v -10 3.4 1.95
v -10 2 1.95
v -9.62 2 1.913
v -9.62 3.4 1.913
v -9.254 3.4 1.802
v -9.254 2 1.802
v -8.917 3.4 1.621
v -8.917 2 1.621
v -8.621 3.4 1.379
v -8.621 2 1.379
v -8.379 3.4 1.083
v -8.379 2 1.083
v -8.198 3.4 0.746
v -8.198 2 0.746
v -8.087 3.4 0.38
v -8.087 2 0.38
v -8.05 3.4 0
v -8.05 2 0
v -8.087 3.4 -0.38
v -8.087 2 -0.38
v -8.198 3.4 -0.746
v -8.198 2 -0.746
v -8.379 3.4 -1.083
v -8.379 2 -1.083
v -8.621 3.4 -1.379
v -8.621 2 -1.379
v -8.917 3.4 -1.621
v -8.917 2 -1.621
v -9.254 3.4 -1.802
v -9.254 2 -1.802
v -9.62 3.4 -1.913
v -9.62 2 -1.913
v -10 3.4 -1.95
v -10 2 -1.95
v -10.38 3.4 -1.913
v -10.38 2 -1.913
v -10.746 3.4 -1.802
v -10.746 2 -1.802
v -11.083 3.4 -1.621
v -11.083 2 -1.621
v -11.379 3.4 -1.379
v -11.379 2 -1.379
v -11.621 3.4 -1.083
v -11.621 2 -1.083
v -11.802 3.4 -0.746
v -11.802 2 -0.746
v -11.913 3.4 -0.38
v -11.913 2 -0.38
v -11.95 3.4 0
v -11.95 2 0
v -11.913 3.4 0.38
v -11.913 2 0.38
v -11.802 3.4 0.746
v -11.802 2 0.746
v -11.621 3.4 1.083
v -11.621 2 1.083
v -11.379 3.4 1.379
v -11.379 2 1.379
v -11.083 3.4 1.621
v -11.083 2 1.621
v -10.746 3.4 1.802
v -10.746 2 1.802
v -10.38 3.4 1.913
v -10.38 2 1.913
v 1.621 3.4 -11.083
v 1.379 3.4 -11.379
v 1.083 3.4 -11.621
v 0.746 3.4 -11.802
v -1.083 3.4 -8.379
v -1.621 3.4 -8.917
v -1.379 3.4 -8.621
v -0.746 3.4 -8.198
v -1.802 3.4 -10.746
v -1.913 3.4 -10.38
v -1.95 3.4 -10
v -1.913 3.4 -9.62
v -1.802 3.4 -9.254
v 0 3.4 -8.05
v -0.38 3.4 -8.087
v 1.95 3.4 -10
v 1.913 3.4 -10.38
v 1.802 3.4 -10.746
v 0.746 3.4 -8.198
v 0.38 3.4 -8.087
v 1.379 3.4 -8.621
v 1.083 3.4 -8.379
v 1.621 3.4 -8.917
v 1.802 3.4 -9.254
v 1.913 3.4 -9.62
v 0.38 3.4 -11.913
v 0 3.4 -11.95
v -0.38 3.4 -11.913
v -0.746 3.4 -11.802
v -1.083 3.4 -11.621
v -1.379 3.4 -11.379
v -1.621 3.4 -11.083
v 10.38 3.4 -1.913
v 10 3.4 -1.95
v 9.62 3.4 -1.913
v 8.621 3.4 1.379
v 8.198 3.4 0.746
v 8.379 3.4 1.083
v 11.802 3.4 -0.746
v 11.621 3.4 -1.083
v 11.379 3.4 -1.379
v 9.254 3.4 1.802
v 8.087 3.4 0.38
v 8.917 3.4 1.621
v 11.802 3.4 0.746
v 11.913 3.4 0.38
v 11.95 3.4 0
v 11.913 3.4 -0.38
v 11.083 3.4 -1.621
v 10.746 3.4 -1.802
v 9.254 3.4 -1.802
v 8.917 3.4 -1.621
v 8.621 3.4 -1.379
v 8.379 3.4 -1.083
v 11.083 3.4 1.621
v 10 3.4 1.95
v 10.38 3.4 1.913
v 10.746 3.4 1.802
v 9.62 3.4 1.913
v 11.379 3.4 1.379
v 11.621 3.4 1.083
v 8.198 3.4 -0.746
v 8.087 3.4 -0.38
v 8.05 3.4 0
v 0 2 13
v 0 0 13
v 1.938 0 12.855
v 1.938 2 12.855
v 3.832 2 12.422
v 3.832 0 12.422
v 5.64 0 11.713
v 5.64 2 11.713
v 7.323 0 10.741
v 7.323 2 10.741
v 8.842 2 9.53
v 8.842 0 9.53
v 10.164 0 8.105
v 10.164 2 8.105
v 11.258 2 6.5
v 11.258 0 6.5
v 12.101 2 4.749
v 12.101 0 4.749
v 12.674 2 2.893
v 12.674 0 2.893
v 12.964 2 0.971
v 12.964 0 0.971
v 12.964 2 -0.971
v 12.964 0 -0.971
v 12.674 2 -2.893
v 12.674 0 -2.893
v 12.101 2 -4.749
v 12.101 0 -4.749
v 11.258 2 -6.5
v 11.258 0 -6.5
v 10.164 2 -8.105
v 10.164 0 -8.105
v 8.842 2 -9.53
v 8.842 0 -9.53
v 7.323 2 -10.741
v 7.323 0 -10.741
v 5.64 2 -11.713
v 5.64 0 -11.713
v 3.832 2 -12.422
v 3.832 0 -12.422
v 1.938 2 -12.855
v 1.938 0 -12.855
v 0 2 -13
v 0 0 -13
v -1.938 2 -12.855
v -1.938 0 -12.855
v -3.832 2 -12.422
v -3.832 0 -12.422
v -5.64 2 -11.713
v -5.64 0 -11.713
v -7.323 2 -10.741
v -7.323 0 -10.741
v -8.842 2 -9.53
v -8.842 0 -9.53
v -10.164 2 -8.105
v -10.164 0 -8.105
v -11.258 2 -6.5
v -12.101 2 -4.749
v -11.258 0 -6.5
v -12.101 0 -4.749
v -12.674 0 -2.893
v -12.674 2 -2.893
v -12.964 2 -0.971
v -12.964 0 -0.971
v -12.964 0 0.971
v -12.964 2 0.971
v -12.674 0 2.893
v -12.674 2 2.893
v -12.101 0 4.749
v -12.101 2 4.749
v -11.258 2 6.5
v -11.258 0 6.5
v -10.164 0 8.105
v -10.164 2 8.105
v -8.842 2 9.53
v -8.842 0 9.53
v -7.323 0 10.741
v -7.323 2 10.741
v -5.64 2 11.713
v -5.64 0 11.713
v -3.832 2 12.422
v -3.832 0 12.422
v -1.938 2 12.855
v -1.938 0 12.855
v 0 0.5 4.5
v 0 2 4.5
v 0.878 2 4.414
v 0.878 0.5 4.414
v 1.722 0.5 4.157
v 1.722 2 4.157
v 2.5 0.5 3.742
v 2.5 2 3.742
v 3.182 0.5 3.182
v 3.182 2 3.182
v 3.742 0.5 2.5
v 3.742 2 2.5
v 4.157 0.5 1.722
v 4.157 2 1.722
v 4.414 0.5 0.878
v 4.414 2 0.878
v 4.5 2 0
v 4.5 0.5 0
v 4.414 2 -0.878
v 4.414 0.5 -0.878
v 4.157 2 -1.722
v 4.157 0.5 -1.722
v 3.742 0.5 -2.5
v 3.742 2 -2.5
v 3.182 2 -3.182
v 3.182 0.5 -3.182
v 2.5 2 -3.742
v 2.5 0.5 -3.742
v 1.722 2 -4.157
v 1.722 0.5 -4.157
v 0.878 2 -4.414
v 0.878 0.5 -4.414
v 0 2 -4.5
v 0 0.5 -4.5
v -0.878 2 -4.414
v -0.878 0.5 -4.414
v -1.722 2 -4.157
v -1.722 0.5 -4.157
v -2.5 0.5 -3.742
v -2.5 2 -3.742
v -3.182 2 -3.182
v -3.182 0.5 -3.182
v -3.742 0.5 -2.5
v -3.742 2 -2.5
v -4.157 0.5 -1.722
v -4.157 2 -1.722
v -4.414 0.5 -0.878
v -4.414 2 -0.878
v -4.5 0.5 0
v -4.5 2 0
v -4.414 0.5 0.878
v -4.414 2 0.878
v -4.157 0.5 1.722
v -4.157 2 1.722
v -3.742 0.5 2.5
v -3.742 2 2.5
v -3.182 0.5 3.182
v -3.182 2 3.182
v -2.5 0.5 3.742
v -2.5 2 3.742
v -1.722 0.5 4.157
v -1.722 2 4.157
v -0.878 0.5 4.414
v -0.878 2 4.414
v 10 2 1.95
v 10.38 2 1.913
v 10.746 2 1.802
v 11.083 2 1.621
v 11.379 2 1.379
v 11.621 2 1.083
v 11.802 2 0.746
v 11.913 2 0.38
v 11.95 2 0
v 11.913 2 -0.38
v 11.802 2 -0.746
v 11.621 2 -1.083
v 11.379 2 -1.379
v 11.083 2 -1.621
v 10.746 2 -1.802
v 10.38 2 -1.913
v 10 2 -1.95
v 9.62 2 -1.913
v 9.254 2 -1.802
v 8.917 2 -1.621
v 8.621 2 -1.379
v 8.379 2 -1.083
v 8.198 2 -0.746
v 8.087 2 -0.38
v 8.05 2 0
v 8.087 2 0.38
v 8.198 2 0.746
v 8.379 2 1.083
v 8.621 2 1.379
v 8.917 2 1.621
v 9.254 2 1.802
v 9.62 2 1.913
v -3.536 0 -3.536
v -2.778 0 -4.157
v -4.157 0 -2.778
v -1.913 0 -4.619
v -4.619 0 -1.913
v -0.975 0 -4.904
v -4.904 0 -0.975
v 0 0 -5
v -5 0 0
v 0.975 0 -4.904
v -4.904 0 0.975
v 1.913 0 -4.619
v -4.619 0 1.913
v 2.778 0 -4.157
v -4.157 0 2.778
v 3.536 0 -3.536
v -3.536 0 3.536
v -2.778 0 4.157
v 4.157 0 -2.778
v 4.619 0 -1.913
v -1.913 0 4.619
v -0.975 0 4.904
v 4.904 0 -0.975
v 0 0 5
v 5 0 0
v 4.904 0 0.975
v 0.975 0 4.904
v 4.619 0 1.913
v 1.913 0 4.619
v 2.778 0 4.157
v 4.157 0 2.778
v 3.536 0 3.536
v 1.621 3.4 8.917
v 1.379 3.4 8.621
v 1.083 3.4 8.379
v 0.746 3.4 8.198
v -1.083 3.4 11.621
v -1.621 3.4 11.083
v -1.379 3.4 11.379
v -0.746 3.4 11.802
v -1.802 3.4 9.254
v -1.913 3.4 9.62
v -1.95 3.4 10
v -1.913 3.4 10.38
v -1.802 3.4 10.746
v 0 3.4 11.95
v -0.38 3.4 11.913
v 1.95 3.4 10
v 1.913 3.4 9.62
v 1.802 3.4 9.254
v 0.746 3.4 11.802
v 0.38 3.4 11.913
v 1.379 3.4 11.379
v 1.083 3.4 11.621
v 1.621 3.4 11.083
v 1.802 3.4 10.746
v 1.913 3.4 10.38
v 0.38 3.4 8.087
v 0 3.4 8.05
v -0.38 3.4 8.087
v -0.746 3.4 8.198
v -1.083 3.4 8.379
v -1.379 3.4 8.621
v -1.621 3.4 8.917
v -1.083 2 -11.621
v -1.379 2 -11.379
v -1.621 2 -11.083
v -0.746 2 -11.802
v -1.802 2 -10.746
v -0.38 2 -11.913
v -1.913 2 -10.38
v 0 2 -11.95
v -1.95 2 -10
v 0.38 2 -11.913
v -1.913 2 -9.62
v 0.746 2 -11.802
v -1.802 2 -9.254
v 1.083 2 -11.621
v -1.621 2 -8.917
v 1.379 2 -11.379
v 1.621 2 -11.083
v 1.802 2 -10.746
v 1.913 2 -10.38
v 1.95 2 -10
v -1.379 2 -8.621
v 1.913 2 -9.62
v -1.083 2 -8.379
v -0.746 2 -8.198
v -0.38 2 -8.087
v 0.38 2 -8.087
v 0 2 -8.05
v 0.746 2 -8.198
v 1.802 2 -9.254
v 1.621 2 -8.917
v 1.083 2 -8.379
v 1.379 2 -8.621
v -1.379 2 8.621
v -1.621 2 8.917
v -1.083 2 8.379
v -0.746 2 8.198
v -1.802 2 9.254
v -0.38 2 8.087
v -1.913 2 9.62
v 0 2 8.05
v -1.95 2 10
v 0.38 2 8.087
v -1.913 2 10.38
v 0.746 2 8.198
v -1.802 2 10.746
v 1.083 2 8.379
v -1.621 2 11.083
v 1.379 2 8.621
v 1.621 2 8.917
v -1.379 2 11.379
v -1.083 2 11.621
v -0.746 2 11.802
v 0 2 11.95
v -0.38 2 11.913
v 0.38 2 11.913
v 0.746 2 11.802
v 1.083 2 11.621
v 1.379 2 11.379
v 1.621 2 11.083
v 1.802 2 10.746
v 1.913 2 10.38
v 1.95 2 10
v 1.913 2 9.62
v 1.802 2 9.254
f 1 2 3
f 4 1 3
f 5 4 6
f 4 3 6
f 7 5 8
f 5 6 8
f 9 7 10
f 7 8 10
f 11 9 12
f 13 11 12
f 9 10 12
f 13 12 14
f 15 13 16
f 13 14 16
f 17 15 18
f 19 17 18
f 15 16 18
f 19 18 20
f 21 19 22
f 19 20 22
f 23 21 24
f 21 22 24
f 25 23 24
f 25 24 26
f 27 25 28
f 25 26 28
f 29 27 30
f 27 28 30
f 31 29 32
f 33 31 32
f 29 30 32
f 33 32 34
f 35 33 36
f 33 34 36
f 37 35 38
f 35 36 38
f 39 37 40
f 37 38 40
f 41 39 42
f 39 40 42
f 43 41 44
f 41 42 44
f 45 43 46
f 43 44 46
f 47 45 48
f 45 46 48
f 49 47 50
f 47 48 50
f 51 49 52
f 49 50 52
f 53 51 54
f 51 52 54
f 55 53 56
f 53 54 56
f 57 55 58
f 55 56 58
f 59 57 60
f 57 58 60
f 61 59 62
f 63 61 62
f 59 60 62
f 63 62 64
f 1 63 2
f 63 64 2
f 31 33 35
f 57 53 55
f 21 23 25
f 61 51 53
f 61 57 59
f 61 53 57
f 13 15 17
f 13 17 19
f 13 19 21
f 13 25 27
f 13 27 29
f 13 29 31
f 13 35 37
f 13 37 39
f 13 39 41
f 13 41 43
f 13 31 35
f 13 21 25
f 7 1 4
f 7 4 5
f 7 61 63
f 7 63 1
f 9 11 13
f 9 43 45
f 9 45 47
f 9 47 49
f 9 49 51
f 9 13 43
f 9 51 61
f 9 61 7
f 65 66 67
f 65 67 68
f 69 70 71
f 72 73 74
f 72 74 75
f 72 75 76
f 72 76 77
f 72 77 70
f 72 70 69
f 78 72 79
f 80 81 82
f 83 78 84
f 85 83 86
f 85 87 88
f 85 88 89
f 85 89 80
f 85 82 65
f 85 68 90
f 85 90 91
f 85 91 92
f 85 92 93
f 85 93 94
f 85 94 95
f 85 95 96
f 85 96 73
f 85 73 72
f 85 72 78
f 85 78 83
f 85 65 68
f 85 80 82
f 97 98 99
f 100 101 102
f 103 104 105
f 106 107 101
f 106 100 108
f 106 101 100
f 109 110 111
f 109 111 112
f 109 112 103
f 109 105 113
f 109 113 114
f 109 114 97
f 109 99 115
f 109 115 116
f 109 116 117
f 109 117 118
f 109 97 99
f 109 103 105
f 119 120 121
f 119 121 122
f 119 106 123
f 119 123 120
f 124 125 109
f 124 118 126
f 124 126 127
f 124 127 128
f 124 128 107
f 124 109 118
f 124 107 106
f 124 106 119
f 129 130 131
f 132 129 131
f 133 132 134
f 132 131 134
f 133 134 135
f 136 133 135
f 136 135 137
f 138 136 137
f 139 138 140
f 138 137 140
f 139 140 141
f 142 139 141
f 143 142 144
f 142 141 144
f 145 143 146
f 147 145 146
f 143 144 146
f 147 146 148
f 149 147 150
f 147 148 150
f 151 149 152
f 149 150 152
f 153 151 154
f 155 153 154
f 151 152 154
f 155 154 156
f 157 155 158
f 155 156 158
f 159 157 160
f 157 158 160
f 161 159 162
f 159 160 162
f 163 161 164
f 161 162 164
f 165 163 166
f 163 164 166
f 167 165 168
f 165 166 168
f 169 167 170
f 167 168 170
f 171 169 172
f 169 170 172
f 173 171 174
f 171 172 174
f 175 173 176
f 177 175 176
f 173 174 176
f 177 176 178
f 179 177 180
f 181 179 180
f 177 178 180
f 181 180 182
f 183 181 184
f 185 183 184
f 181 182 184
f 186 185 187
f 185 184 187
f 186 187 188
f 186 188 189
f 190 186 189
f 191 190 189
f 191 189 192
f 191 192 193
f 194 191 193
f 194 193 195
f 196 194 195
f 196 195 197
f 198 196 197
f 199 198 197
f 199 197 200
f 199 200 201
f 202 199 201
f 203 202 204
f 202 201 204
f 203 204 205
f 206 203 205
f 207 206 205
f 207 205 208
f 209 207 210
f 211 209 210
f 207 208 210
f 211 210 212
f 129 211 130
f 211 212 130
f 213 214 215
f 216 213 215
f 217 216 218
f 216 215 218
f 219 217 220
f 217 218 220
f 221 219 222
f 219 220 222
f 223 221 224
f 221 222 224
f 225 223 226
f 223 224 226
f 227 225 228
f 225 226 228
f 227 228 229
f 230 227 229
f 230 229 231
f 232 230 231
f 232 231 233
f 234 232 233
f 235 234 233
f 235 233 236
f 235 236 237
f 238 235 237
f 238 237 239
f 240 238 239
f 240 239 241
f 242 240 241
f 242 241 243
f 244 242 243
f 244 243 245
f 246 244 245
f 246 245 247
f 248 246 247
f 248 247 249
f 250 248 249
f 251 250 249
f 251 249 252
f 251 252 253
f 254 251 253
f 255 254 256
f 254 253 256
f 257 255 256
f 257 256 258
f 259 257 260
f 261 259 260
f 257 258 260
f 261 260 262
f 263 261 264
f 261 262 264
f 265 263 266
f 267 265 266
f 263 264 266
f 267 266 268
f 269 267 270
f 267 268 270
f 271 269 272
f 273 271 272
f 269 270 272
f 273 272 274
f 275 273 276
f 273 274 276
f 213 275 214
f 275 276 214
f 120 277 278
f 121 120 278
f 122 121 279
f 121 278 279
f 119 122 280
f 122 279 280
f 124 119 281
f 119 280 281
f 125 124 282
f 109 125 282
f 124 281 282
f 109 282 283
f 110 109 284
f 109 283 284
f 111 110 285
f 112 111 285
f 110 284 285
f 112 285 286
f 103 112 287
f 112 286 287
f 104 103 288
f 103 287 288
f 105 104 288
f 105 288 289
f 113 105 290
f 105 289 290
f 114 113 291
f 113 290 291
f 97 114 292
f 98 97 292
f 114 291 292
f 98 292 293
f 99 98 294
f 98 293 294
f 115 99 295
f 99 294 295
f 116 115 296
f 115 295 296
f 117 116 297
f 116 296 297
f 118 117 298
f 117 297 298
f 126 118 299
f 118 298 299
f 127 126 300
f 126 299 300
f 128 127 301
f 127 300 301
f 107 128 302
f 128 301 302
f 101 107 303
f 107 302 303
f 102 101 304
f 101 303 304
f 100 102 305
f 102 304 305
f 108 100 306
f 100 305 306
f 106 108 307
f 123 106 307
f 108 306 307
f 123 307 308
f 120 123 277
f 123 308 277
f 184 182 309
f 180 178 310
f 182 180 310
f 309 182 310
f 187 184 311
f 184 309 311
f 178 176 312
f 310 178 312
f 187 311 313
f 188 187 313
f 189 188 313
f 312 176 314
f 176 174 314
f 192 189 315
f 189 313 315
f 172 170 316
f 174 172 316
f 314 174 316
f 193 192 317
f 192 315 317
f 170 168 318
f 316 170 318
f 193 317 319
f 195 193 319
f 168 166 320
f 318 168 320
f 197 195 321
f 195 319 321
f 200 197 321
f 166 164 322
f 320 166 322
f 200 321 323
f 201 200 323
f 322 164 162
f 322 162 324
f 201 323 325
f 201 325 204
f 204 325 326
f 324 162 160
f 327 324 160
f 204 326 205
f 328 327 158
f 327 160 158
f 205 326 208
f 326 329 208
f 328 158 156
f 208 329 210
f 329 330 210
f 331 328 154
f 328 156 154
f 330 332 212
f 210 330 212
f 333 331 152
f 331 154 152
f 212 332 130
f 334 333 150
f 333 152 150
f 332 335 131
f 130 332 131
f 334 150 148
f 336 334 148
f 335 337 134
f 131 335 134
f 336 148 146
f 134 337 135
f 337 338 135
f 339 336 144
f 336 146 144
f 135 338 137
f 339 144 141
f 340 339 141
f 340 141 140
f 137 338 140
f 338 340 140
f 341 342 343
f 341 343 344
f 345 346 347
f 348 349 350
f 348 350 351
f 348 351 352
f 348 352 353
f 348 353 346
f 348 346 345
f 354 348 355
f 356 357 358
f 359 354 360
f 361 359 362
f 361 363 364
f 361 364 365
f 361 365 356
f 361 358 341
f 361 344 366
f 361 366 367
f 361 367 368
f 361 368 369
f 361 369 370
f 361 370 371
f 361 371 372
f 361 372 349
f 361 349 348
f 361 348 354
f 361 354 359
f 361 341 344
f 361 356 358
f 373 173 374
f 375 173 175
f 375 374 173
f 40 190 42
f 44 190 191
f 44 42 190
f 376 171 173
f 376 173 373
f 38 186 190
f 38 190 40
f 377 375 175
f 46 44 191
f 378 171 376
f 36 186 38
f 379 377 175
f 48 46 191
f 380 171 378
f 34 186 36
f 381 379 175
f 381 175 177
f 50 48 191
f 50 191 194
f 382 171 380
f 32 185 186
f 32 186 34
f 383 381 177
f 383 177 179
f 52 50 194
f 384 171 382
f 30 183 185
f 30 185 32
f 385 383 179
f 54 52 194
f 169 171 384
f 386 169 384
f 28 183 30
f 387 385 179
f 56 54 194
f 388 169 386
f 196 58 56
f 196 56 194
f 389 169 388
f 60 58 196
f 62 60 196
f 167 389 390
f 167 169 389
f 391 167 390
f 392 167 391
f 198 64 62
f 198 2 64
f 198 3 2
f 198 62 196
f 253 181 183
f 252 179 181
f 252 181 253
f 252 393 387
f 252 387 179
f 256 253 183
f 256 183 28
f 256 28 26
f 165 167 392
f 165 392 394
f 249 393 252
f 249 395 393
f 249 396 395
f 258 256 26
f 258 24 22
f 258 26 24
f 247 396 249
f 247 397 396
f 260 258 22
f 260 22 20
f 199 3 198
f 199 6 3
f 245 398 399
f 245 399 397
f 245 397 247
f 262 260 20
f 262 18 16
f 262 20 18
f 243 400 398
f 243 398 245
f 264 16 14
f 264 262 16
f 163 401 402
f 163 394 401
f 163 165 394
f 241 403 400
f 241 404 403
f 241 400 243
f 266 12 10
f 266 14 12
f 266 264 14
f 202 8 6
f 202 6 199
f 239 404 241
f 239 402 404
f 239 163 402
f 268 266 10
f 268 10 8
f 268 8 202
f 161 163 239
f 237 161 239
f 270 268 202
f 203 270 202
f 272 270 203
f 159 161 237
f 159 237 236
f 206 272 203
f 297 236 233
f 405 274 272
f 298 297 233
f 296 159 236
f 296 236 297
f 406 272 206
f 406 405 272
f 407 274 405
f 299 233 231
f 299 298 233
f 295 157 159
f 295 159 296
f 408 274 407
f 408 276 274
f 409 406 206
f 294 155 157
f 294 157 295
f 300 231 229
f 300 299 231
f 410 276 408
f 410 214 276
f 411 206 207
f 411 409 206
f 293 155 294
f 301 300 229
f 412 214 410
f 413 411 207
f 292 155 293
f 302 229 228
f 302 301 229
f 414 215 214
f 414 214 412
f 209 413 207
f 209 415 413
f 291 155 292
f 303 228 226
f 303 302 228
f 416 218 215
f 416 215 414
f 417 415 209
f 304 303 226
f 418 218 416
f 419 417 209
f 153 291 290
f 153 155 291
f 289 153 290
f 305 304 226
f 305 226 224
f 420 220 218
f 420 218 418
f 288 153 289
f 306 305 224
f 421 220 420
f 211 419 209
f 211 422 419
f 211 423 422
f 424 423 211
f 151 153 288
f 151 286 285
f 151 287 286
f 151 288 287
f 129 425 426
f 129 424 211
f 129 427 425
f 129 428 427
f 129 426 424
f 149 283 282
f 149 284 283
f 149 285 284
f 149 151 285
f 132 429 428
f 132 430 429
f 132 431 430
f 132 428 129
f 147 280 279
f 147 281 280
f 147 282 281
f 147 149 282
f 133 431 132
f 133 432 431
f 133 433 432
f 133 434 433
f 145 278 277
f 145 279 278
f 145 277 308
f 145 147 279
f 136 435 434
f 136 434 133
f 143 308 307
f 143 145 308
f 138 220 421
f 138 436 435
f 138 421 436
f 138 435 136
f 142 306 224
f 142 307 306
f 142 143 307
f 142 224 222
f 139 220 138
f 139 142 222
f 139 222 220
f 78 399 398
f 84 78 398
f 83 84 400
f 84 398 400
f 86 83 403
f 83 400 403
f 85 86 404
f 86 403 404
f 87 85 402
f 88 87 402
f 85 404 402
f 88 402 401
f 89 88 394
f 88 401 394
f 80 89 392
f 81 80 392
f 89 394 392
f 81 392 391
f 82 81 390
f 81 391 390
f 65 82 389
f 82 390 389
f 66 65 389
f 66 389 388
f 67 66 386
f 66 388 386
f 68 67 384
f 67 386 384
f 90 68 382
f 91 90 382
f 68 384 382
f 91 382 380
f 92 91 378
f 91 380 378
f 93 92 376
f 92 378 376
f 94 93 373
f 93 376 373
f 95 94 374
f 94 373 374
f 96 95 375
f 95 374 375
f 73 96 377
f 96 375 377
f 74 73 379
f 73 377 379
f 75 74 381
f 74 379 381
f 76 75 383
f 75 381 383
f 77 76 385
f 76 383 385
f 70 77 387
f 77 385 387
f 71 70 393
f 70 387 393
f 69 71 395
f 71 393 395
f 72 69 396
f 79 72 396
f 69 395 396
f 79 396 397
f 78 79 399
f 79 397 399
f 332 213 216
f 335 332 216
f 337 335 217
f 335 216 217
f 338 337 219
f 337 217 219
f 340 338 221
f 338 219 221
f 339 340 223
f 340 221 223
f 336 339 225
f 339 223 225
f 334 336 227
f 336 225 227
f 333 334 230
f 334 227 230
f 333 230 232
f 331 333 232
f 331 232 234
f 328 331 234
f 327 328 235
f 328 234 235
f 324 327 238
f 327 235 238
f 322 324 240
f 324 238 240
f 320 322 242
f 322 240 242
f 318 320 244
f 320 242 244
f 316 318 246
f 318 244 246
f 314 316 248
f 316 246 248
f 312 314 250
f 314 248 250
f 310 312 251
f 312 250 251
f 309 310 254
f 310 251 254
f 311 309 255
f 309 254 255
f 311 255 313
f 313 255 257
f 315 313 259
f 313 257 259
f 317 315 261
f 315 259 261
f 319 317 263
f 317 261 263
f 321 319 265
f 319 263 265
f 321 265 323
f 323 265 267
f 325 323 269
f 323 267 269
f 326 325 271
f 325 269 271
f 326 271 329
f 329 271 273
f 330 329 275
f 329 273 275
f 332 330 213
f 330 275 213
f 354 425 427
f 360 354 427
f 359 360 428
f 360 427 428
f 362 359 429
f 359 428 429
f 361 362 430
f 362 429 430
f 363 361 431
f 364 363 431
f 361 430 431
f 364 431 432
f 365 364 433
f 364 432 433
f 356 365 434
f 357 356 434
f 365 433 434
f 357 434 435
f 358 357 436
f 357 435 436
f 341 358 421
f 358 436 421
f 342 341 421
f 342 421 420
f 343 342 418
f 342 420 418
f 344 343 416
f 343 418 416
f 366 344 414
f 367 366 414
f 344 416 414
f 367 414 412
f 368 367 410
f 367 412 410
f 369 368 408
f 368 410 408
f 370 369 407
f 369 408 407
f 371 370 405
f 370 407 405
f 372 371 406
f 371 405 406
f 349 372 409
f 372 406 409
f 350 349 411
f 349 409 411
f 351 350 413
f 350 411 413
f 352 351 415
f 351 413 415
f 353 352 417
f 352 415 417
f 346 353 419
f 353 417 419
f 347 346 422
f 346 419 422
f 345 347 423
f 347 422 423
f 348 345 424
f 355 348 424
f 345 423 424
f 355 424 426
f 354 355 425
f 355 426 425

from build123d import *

# Parameters (mm, degrees)
SKETCH1_R           = 13
BOSS_EXTRUDE1_DEPTH = 2
SKETCH2_R           = 4.5
CUT_EXTRUDE1_DEPTH  = 19.493242009
SKETCH3_R           = 1.95
BOSS_EXTRUDE2_DEPTH = 1.4
CHAMFER1_SIZE       = 0.5


with BuildPart() as part:
    # Sketch1 → Boss-Extrude1 (new body)
    with BuildSketch(Plane(origin=(0, 0, 0), x_dir=(1, 0, 0), z_dir=(0, 1, 0))):
        with Locations(Location((0, 0, 0), (0, 0, 270))):
            Circle(SKETCH1_R)
    extrude(amount=BOSS_EXTRUDE1_DEPTH)

    # Sketch2 → Cut-Extrude1 (cut, through all)
    with BuildSketch(Plane(origin=(0, 2, 0), x_dir=(1, 0, 0), z_dir=(0, 1, 0))):
        with Locations(Location((0, 0, 0), (0, 0, 270))):
            Circle(SKETCH2_R)
    extrude(amount=-CUT_EXTRUDE1_DEPTH, mode=Mode.SUBTRACT)

    # Sketch3 → Boss-Extrude2 (add)
    with BuildSketch(Plane(origin=(0, 2, 0), x_dir=(1, 0, 0), z_dir=(0, 1, 0))):
        with Locations(Location((0, 10, 0), (0, 0, 270))):
            Circle(SKETCH3_R)
        with Locations(Location((10, 0, 0), (0, 0, 270))):
            Circle(SKETCH3_R)
        with Locations(Location((-10, 0, 0), (0, 0, 270))):
            Circle(SKETCH3_R)
        with Locations(Location((0, -10, 0), (0, 0, 270))):
            Circle(SKETCH3_R)
    extrude(amount=BOSS_EXTRUDE2_DEPTH)

    # Chamfer1
    chamfer1_edges = [part.edges().sort_by_distance(p)[0] for p in [
        (0, 0, -4.5),
    ]]
    chamfer(chamfer1_edges, length=CHAMFER1_SIZE)


solid = part.part
